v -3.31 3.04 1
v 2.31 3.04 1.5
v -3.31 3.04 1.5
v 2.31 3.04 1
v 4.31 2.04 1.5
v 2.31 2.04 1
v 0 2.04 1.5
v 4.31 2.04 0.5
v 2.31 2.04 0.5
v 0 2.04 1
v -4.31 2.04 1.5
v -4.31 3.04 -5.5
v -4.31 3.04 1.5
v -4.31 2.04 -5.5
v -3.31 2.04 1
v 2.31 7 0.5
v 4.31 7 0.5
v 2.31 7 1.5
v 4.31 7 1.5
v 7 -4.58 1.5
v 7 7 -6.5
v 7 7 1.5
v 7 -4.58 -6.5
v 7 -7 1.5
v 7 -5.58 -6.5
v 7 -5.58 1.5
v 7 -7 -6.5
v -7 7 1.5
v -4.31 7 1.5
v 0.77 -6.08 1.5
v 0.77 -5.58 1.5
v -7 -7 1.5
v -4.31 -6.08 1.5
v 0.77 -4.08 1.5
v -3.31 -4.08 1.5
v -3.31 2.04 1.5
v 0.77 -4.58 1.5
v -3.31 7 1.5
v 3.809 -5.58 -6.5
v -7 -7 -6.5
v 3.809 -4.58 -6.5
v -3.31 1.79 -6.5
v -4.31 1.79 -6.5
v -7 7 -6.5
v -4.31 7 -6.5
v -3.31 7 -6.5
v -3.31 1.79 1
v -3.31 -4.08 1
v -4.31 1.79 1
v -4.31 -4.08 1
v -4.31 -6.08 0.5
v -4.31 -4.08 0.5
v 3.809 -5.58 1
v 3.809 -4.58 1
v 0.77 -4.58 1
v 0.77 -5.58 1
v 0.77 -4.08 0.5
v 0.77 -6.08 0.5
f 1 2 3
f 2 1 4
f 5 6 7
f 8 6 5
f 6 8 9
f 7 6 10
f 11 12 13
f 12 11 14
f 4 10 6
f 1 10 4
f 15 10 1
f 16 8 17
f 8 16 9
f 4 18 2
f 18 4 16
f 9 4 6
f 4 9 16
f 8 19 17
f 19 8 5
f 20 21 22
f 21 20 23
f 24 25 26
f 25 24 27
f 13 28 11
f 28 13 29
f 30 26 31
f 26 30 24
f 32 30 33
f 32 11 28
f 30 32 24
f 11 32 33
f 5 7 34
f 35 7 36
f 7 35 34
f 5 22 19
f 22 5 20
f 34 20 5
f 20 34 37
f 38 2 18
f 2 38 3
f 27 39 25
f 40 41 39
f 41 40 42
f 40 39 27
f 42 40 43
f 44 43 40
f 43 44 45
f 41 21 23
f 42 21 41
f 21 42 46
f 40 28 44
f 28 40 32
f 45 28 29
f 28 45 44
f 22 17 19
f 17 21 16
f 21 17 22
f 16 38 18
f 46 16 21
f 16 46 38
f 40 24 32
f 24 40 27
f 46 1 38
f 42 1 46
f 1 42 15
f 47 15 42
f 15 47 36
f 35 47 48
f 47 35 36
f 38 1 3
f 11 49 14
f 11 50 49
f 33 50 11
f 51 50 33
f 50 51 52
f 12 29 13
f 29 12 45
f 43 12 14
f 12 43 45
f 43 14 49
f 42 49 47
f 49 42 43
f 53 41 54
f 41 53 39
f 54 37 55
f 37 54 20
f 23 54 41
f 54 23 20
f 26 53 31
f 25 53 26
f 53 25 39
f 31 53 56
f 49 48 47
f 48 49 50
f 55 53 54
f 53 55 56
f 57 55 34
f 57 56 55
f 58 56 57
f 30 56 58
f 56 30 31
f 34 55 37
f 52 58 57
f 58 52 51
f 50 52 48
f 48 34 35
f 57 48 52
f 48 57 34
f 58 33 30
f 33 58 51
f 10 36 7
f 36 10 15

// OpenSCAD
// file: ../../parameters.scad
/* PCB Parameters */
// Diameter of row/column wire channels
wire_diameter = 2.15;
// Upward angle of switch pin in contact with diode anode (gives more reliable
// connections but slightly deforms pin)
diode_pin_angle = 5;  // [0:15]
// Amount the diode folds over
diode_foldover = 4;
// Overall thickness of PCB
pcb_thickness = 4;  // [4:0.1:10]

/* Switch Parameters */
// Switch type
switch_type = "mx";  // [mx, choc]
// Switch orientation (based on LED location)
switch_orientation = "south";  // [north, south]
// Whether to use experimental diode leg contact
use_folded_contact = true;


/* Stabilizer Parameters */
stabilizer_type = "pcb";  // [pcb, plate]


/* Case Parameters */
// Type of case to generate
case_type = "plate_case";  // [sandwich, plate_case, backplate_case]
// Thickness of case walls
case_wall_thickness = 2;
// Case wall draft angle (convex cases only)
case_wall_draft_angle = 15;
// Width of the case chamfer (convex cases only)
case_chamfer_width = 1;
// Angle of the case chamfer (convex cases only)
case_chamfer_angle = 45;
// Height of the vertical portion at the bottom of the case 
// (not including backplate flange)
case_base_height = 2;
// Fit tolerance between interlocking case parts
case_fit_tolerance = 0.2;
// Tenting angle around x-axis
tent_angle_x = 3;
// Tenting angle around y-axis (i.e. typing angle)
tent_angle_y = 0;
// Point around which keyboard is tented
tent_point = [0,8.125*19.05];


/* Plate Parameters */
// Distance the plate sticks out past the PCB
plate_margin = 5;
// Radius of outer fillets
plate_outer_fillet = 2.5;
// Radius of inner fillets
plate_inner_fillet = 50;
// Setting this lower can help fix geometry issues when using custom plate shapes
// (i.e. two components that don't meet at exactly the same point can cause offset issues)
plate_precision = 1/100;


/* Backplate Parameters */
// Thickness of the backplate
backplate_thickness = 2;
// Thickness of flange around backplate if using an integrated-plate case
backplate_case_flange = 1;
// Spacing between the bottom of the PCB and the top of the backplate
pcb_backplate_spacing = 4;


/* MCU Parameters (Default values for Pro Micro) */
mcu_type = "bare";  // [bare, socketed]
mcu_width = 18.5;
mcu_length = 33.3;
mcu_height = 4.25;  // Distance to top of PCB
mcu_row_spacing = 15.24;
mcu_row_count = 2;  // Unused
mcu_pin_count = 24;
mcu_pin_pitch = 2.54;
mcu_pin_offset = 0.3;  // Offset from the rear of the PCB
mcu_connector_width = 13;  // Width of the connector (for plate cutout)
mcu_connector_length = 4;  // Distance the connector extends onto the MCU (for plate cutout)
mcu_connector_height = 8;  // Height of the plug housing
mcu_connector_offset = 2; // Vertical offset of plug center from PCB center
mcu_pcb_thickness = 1.6;
mcu_socket_width = mcu_width+4;
mcu_socket_length = mcu_length+4;
expose_mcu = false;
grid_size = 8;
grid_spacing = 1.6;

/* Via Parameters */
via_width = 5;
via_length = 15;
via_shape = [via_width, via_length];


/* Standoff Parameters */
// Component the standoff is integrated with
standoff_integration_default = "plate";  // [plate, backplate, pcb, separate, none]
// Component the standoff is screwed to
standoff_attachment_default = "pcb";  // [plate, backplate, pcb, plate_backplate, none]
// Intermediate shape variable to pass around
standoff_config_default = [
    standoff_integration_default,
    standoff_attachment_default
];
// Diameter of integrated standoffs
standoff_diameter = 4.5;
// Diameter of standoff clearance hole
standoff_clearance_hole_diameter = 2.5;
// Diameter of standoff pilot hole
standoff_pilot_hole_diameter = 1.6;
// Diameter of standoff screw head counterbores
standoff_counterbore_diameter = 4.5;


/* Misc Parameters */
// Increase this if your standoffs are a bit too long due to printing tolerances
fit_tolerance = 0;
// Resolution of holes (affects render times)
$fn=12;


/* Advanced Parameters (related to switch size) */
// Switch spacing distance
unit = 19.05;
// Horizontal unit size (18mm for choc keycaps)
h_unit = unit;
// Vertical unit size (17mm for choc keycaps)
v_unit = unit;
// Spacing of grid for MX pins
grid = 1.27;
// Size of socket body
socket_size =
    switch_type == "mx"
    ? 14
    : switch_type == "choc"
        ? 15
        : assert(false, "switch_type is invalid");
// Depth of the socket holes
socket_depth = 3.5;
// Thickness of the plate
plate_thickness =
    switch_type == "mx"
    ? 1.5
    : switch_type == "choc"
        ? 1.3
        : assert(false, "switch_type is invalid");
// Size of the plate cutout
plate_cutout_size =
    switch_type == "mx"
    ? 14
    : switch_type == "choc"
        ? 13.8
        : assert(false, "switch_type is invalid");
// Spacing between the top of the PCB and top of the plate
pcb_plate_spacing =
    switch_type == "mx"
    ? 5
    : switch_type == "choc"
        ? 2.2
        : assert(false, "switch_type is invalid");

// Total assembly thickness (for reference)
total_thickness =
    pcb_plate_spacing + pcb_thickness + pcb_backplate_spacing + backplate_thickness;

// Width of a border unit around the socket (for joining adjacent sockets)
border_width = (unit - socket_size)/2;
h_border_width = (h_unit - socket_size)/2;
v_border_width = (v_unit - socket_size)/2;

// Conversion factor from border width to mm (for use in layouts)
mm = 1/border_width;
h_mm = 1/h_border_width;
v_mm = 1/v_border_width;

// Align mcu to a unit
mcu_unit_resolution = .5;  // Grid size to snap to (as fractional unit)
mcu_h_unit_size = ceil(mcu_socket_width/mcu_unit_resolution/h_unit) * mcu_unit_resolution;
mcu_v_unit_size = ceil(mcu_socket_length/mcu_unit_resolution/v_unit) * mcu_unit_resolution;

// Useful for manipulating layout elements
function slice(array, bounds, extra_data_override="") = [
    let(
        lower = bounds[0] >= 0 ? bounds[0] : max(len(array)+bounds[0], 0),
        upper = bounds[1] > 0 ? min(bounds[1], len(array)) : len(array)+bounds[1],
        step = len(bounds) == 3 ? bounds[2] : 1
    )
    for (i = [lower:step:upper-1])
       len(array[i]) >= 2 && extra_data_override != ""
            ? [array[i][0], array[i][1], extra_data_override]
            : array[i]
];
// main file
include <../../parameters.scad>

module mx_improved_diode_template() {
    difference() {
        translate([0,0,-diode_foldover/2-0.5])
            cube([socket_size, socket_size, pcb_thickness+diode_foldover], center=true);
            
        // Bottom switch pin
        translate([-3*grid,2*grid,0])
            translate([0,socket_size/2-0.75,0])
                cube([1,socket_size,pcb_thickness+diode_foldover*2+2],center=true);
        // Diode cathode cutout
        translate([3*grid,-4*grid,0])
            translate([socket_size/2-0.001,0,0])
                cube([socket_size,1,pcb_thickness+diode_foldover*2+2],center=true);

        // Diode Channel
        translate([-3*grid,-1*grid-.25,pcb_thickness/2])
            cube([1,6*grid+.5,2],center=true);
        translate([0,-4*grid,pcb_thickness/2])
           cube([6*grid,1,2],center=true);
        translate([-1*grid-.5,-4*grid,pcb_thickness/2])
            cube([4*grid,2,3],center=true);
        
        translate([-1.5*grid,2*grid,pcb_thickness/2])
            cube([3*grid,1,2],center=true);


        translate([-grid-0.5,5*grid,0]) rotate([0,0,90]) {
            // Bottom switch pin
            translate([-3*grid,2*grid,0])
                translate([0,-0.5,0])
                    cube([1,1,pcb_thickness+7],center=true);

            // Diode Channel
            translate([-3*grid,-1*grid-.25,pcb_thickness/2])
                cube([1,6*grid+.5,2],center=true);
            translate([0,-4*grid,pcb_thickness/2])
               cube([6*grid,1,2],center=true);
            translate([-1*grid-.5,-4*grid,pcb_thickness/2])
                cube([4*grid,2,3],center=true);

        }
     }
}

module mx_diode_template() {
    difference() {
        cube([socket_size, socket_size, pcb_thickness], center=true);
            
        // Bottom switch pin
        translate([-3*grid,2*grid,0])
            translate([0,socket_size/2-0.001,0])
                cube([1,socket_size,pcb_thickness+1],center=true);
        // Diode cathode cutout
        translate([3*grid,-4*grid,0])
            translate([socket_size/2-0.001,0,0])
                cube([socket_size,1,pcb_thickness+1],center=true);

        // Diode Channel
        translate([-3*grid,-1*grid-.25,pcb_thickness/2])
            cube([1,6*grid+.5,2],center=true);
        translate([0,-4*grid,pcb_thickness/2])
            cube([6*grid,1,2],center=true);
        translate([-1*grid-.5,-4*grid,pcb_thickness/2])
            cube([4*grid,2,3],center=true);
    }
}

module choc_diode_template() {
    difference() {
        cube([socket_size, socket_size, pcb_thickness], center=true);
            
        // Bottom switch pin
        translate([5,3.8,0])
            translate([socket_size/2-0.001,0,0])
                cube([socket_size,1,pcb_thickness+1],center=true);
        // Diode cathode cutout
        translate([-3.125,-3.8,0])
            translate([0,-socket_size/2+0.001,0])
                cube([1,socket_size,pcb_thickness+1],center=true);

        // Diode Channel
        translate([-3.125,0,pcb_thickness/2])
            cube([1,7.6,2],center=true);
        translate([.75,3.8,pcb_thickness/2])
            cube([8.5,1,2],center=true);
        translate([-3.125,1.8,pcb_thickness/2])
            cube([2,5,3.5],center=true);
    }
}

if (switch_type == "mx") {
    if (use_folded_contact) {
        mx_improved_diode_template();
    } else {
        mx_diode_template();
    }        
} else if (switch_type == "choc") {
    choc_diode_template();
} else {
    assert(false, "switch_type is invalid");
}
